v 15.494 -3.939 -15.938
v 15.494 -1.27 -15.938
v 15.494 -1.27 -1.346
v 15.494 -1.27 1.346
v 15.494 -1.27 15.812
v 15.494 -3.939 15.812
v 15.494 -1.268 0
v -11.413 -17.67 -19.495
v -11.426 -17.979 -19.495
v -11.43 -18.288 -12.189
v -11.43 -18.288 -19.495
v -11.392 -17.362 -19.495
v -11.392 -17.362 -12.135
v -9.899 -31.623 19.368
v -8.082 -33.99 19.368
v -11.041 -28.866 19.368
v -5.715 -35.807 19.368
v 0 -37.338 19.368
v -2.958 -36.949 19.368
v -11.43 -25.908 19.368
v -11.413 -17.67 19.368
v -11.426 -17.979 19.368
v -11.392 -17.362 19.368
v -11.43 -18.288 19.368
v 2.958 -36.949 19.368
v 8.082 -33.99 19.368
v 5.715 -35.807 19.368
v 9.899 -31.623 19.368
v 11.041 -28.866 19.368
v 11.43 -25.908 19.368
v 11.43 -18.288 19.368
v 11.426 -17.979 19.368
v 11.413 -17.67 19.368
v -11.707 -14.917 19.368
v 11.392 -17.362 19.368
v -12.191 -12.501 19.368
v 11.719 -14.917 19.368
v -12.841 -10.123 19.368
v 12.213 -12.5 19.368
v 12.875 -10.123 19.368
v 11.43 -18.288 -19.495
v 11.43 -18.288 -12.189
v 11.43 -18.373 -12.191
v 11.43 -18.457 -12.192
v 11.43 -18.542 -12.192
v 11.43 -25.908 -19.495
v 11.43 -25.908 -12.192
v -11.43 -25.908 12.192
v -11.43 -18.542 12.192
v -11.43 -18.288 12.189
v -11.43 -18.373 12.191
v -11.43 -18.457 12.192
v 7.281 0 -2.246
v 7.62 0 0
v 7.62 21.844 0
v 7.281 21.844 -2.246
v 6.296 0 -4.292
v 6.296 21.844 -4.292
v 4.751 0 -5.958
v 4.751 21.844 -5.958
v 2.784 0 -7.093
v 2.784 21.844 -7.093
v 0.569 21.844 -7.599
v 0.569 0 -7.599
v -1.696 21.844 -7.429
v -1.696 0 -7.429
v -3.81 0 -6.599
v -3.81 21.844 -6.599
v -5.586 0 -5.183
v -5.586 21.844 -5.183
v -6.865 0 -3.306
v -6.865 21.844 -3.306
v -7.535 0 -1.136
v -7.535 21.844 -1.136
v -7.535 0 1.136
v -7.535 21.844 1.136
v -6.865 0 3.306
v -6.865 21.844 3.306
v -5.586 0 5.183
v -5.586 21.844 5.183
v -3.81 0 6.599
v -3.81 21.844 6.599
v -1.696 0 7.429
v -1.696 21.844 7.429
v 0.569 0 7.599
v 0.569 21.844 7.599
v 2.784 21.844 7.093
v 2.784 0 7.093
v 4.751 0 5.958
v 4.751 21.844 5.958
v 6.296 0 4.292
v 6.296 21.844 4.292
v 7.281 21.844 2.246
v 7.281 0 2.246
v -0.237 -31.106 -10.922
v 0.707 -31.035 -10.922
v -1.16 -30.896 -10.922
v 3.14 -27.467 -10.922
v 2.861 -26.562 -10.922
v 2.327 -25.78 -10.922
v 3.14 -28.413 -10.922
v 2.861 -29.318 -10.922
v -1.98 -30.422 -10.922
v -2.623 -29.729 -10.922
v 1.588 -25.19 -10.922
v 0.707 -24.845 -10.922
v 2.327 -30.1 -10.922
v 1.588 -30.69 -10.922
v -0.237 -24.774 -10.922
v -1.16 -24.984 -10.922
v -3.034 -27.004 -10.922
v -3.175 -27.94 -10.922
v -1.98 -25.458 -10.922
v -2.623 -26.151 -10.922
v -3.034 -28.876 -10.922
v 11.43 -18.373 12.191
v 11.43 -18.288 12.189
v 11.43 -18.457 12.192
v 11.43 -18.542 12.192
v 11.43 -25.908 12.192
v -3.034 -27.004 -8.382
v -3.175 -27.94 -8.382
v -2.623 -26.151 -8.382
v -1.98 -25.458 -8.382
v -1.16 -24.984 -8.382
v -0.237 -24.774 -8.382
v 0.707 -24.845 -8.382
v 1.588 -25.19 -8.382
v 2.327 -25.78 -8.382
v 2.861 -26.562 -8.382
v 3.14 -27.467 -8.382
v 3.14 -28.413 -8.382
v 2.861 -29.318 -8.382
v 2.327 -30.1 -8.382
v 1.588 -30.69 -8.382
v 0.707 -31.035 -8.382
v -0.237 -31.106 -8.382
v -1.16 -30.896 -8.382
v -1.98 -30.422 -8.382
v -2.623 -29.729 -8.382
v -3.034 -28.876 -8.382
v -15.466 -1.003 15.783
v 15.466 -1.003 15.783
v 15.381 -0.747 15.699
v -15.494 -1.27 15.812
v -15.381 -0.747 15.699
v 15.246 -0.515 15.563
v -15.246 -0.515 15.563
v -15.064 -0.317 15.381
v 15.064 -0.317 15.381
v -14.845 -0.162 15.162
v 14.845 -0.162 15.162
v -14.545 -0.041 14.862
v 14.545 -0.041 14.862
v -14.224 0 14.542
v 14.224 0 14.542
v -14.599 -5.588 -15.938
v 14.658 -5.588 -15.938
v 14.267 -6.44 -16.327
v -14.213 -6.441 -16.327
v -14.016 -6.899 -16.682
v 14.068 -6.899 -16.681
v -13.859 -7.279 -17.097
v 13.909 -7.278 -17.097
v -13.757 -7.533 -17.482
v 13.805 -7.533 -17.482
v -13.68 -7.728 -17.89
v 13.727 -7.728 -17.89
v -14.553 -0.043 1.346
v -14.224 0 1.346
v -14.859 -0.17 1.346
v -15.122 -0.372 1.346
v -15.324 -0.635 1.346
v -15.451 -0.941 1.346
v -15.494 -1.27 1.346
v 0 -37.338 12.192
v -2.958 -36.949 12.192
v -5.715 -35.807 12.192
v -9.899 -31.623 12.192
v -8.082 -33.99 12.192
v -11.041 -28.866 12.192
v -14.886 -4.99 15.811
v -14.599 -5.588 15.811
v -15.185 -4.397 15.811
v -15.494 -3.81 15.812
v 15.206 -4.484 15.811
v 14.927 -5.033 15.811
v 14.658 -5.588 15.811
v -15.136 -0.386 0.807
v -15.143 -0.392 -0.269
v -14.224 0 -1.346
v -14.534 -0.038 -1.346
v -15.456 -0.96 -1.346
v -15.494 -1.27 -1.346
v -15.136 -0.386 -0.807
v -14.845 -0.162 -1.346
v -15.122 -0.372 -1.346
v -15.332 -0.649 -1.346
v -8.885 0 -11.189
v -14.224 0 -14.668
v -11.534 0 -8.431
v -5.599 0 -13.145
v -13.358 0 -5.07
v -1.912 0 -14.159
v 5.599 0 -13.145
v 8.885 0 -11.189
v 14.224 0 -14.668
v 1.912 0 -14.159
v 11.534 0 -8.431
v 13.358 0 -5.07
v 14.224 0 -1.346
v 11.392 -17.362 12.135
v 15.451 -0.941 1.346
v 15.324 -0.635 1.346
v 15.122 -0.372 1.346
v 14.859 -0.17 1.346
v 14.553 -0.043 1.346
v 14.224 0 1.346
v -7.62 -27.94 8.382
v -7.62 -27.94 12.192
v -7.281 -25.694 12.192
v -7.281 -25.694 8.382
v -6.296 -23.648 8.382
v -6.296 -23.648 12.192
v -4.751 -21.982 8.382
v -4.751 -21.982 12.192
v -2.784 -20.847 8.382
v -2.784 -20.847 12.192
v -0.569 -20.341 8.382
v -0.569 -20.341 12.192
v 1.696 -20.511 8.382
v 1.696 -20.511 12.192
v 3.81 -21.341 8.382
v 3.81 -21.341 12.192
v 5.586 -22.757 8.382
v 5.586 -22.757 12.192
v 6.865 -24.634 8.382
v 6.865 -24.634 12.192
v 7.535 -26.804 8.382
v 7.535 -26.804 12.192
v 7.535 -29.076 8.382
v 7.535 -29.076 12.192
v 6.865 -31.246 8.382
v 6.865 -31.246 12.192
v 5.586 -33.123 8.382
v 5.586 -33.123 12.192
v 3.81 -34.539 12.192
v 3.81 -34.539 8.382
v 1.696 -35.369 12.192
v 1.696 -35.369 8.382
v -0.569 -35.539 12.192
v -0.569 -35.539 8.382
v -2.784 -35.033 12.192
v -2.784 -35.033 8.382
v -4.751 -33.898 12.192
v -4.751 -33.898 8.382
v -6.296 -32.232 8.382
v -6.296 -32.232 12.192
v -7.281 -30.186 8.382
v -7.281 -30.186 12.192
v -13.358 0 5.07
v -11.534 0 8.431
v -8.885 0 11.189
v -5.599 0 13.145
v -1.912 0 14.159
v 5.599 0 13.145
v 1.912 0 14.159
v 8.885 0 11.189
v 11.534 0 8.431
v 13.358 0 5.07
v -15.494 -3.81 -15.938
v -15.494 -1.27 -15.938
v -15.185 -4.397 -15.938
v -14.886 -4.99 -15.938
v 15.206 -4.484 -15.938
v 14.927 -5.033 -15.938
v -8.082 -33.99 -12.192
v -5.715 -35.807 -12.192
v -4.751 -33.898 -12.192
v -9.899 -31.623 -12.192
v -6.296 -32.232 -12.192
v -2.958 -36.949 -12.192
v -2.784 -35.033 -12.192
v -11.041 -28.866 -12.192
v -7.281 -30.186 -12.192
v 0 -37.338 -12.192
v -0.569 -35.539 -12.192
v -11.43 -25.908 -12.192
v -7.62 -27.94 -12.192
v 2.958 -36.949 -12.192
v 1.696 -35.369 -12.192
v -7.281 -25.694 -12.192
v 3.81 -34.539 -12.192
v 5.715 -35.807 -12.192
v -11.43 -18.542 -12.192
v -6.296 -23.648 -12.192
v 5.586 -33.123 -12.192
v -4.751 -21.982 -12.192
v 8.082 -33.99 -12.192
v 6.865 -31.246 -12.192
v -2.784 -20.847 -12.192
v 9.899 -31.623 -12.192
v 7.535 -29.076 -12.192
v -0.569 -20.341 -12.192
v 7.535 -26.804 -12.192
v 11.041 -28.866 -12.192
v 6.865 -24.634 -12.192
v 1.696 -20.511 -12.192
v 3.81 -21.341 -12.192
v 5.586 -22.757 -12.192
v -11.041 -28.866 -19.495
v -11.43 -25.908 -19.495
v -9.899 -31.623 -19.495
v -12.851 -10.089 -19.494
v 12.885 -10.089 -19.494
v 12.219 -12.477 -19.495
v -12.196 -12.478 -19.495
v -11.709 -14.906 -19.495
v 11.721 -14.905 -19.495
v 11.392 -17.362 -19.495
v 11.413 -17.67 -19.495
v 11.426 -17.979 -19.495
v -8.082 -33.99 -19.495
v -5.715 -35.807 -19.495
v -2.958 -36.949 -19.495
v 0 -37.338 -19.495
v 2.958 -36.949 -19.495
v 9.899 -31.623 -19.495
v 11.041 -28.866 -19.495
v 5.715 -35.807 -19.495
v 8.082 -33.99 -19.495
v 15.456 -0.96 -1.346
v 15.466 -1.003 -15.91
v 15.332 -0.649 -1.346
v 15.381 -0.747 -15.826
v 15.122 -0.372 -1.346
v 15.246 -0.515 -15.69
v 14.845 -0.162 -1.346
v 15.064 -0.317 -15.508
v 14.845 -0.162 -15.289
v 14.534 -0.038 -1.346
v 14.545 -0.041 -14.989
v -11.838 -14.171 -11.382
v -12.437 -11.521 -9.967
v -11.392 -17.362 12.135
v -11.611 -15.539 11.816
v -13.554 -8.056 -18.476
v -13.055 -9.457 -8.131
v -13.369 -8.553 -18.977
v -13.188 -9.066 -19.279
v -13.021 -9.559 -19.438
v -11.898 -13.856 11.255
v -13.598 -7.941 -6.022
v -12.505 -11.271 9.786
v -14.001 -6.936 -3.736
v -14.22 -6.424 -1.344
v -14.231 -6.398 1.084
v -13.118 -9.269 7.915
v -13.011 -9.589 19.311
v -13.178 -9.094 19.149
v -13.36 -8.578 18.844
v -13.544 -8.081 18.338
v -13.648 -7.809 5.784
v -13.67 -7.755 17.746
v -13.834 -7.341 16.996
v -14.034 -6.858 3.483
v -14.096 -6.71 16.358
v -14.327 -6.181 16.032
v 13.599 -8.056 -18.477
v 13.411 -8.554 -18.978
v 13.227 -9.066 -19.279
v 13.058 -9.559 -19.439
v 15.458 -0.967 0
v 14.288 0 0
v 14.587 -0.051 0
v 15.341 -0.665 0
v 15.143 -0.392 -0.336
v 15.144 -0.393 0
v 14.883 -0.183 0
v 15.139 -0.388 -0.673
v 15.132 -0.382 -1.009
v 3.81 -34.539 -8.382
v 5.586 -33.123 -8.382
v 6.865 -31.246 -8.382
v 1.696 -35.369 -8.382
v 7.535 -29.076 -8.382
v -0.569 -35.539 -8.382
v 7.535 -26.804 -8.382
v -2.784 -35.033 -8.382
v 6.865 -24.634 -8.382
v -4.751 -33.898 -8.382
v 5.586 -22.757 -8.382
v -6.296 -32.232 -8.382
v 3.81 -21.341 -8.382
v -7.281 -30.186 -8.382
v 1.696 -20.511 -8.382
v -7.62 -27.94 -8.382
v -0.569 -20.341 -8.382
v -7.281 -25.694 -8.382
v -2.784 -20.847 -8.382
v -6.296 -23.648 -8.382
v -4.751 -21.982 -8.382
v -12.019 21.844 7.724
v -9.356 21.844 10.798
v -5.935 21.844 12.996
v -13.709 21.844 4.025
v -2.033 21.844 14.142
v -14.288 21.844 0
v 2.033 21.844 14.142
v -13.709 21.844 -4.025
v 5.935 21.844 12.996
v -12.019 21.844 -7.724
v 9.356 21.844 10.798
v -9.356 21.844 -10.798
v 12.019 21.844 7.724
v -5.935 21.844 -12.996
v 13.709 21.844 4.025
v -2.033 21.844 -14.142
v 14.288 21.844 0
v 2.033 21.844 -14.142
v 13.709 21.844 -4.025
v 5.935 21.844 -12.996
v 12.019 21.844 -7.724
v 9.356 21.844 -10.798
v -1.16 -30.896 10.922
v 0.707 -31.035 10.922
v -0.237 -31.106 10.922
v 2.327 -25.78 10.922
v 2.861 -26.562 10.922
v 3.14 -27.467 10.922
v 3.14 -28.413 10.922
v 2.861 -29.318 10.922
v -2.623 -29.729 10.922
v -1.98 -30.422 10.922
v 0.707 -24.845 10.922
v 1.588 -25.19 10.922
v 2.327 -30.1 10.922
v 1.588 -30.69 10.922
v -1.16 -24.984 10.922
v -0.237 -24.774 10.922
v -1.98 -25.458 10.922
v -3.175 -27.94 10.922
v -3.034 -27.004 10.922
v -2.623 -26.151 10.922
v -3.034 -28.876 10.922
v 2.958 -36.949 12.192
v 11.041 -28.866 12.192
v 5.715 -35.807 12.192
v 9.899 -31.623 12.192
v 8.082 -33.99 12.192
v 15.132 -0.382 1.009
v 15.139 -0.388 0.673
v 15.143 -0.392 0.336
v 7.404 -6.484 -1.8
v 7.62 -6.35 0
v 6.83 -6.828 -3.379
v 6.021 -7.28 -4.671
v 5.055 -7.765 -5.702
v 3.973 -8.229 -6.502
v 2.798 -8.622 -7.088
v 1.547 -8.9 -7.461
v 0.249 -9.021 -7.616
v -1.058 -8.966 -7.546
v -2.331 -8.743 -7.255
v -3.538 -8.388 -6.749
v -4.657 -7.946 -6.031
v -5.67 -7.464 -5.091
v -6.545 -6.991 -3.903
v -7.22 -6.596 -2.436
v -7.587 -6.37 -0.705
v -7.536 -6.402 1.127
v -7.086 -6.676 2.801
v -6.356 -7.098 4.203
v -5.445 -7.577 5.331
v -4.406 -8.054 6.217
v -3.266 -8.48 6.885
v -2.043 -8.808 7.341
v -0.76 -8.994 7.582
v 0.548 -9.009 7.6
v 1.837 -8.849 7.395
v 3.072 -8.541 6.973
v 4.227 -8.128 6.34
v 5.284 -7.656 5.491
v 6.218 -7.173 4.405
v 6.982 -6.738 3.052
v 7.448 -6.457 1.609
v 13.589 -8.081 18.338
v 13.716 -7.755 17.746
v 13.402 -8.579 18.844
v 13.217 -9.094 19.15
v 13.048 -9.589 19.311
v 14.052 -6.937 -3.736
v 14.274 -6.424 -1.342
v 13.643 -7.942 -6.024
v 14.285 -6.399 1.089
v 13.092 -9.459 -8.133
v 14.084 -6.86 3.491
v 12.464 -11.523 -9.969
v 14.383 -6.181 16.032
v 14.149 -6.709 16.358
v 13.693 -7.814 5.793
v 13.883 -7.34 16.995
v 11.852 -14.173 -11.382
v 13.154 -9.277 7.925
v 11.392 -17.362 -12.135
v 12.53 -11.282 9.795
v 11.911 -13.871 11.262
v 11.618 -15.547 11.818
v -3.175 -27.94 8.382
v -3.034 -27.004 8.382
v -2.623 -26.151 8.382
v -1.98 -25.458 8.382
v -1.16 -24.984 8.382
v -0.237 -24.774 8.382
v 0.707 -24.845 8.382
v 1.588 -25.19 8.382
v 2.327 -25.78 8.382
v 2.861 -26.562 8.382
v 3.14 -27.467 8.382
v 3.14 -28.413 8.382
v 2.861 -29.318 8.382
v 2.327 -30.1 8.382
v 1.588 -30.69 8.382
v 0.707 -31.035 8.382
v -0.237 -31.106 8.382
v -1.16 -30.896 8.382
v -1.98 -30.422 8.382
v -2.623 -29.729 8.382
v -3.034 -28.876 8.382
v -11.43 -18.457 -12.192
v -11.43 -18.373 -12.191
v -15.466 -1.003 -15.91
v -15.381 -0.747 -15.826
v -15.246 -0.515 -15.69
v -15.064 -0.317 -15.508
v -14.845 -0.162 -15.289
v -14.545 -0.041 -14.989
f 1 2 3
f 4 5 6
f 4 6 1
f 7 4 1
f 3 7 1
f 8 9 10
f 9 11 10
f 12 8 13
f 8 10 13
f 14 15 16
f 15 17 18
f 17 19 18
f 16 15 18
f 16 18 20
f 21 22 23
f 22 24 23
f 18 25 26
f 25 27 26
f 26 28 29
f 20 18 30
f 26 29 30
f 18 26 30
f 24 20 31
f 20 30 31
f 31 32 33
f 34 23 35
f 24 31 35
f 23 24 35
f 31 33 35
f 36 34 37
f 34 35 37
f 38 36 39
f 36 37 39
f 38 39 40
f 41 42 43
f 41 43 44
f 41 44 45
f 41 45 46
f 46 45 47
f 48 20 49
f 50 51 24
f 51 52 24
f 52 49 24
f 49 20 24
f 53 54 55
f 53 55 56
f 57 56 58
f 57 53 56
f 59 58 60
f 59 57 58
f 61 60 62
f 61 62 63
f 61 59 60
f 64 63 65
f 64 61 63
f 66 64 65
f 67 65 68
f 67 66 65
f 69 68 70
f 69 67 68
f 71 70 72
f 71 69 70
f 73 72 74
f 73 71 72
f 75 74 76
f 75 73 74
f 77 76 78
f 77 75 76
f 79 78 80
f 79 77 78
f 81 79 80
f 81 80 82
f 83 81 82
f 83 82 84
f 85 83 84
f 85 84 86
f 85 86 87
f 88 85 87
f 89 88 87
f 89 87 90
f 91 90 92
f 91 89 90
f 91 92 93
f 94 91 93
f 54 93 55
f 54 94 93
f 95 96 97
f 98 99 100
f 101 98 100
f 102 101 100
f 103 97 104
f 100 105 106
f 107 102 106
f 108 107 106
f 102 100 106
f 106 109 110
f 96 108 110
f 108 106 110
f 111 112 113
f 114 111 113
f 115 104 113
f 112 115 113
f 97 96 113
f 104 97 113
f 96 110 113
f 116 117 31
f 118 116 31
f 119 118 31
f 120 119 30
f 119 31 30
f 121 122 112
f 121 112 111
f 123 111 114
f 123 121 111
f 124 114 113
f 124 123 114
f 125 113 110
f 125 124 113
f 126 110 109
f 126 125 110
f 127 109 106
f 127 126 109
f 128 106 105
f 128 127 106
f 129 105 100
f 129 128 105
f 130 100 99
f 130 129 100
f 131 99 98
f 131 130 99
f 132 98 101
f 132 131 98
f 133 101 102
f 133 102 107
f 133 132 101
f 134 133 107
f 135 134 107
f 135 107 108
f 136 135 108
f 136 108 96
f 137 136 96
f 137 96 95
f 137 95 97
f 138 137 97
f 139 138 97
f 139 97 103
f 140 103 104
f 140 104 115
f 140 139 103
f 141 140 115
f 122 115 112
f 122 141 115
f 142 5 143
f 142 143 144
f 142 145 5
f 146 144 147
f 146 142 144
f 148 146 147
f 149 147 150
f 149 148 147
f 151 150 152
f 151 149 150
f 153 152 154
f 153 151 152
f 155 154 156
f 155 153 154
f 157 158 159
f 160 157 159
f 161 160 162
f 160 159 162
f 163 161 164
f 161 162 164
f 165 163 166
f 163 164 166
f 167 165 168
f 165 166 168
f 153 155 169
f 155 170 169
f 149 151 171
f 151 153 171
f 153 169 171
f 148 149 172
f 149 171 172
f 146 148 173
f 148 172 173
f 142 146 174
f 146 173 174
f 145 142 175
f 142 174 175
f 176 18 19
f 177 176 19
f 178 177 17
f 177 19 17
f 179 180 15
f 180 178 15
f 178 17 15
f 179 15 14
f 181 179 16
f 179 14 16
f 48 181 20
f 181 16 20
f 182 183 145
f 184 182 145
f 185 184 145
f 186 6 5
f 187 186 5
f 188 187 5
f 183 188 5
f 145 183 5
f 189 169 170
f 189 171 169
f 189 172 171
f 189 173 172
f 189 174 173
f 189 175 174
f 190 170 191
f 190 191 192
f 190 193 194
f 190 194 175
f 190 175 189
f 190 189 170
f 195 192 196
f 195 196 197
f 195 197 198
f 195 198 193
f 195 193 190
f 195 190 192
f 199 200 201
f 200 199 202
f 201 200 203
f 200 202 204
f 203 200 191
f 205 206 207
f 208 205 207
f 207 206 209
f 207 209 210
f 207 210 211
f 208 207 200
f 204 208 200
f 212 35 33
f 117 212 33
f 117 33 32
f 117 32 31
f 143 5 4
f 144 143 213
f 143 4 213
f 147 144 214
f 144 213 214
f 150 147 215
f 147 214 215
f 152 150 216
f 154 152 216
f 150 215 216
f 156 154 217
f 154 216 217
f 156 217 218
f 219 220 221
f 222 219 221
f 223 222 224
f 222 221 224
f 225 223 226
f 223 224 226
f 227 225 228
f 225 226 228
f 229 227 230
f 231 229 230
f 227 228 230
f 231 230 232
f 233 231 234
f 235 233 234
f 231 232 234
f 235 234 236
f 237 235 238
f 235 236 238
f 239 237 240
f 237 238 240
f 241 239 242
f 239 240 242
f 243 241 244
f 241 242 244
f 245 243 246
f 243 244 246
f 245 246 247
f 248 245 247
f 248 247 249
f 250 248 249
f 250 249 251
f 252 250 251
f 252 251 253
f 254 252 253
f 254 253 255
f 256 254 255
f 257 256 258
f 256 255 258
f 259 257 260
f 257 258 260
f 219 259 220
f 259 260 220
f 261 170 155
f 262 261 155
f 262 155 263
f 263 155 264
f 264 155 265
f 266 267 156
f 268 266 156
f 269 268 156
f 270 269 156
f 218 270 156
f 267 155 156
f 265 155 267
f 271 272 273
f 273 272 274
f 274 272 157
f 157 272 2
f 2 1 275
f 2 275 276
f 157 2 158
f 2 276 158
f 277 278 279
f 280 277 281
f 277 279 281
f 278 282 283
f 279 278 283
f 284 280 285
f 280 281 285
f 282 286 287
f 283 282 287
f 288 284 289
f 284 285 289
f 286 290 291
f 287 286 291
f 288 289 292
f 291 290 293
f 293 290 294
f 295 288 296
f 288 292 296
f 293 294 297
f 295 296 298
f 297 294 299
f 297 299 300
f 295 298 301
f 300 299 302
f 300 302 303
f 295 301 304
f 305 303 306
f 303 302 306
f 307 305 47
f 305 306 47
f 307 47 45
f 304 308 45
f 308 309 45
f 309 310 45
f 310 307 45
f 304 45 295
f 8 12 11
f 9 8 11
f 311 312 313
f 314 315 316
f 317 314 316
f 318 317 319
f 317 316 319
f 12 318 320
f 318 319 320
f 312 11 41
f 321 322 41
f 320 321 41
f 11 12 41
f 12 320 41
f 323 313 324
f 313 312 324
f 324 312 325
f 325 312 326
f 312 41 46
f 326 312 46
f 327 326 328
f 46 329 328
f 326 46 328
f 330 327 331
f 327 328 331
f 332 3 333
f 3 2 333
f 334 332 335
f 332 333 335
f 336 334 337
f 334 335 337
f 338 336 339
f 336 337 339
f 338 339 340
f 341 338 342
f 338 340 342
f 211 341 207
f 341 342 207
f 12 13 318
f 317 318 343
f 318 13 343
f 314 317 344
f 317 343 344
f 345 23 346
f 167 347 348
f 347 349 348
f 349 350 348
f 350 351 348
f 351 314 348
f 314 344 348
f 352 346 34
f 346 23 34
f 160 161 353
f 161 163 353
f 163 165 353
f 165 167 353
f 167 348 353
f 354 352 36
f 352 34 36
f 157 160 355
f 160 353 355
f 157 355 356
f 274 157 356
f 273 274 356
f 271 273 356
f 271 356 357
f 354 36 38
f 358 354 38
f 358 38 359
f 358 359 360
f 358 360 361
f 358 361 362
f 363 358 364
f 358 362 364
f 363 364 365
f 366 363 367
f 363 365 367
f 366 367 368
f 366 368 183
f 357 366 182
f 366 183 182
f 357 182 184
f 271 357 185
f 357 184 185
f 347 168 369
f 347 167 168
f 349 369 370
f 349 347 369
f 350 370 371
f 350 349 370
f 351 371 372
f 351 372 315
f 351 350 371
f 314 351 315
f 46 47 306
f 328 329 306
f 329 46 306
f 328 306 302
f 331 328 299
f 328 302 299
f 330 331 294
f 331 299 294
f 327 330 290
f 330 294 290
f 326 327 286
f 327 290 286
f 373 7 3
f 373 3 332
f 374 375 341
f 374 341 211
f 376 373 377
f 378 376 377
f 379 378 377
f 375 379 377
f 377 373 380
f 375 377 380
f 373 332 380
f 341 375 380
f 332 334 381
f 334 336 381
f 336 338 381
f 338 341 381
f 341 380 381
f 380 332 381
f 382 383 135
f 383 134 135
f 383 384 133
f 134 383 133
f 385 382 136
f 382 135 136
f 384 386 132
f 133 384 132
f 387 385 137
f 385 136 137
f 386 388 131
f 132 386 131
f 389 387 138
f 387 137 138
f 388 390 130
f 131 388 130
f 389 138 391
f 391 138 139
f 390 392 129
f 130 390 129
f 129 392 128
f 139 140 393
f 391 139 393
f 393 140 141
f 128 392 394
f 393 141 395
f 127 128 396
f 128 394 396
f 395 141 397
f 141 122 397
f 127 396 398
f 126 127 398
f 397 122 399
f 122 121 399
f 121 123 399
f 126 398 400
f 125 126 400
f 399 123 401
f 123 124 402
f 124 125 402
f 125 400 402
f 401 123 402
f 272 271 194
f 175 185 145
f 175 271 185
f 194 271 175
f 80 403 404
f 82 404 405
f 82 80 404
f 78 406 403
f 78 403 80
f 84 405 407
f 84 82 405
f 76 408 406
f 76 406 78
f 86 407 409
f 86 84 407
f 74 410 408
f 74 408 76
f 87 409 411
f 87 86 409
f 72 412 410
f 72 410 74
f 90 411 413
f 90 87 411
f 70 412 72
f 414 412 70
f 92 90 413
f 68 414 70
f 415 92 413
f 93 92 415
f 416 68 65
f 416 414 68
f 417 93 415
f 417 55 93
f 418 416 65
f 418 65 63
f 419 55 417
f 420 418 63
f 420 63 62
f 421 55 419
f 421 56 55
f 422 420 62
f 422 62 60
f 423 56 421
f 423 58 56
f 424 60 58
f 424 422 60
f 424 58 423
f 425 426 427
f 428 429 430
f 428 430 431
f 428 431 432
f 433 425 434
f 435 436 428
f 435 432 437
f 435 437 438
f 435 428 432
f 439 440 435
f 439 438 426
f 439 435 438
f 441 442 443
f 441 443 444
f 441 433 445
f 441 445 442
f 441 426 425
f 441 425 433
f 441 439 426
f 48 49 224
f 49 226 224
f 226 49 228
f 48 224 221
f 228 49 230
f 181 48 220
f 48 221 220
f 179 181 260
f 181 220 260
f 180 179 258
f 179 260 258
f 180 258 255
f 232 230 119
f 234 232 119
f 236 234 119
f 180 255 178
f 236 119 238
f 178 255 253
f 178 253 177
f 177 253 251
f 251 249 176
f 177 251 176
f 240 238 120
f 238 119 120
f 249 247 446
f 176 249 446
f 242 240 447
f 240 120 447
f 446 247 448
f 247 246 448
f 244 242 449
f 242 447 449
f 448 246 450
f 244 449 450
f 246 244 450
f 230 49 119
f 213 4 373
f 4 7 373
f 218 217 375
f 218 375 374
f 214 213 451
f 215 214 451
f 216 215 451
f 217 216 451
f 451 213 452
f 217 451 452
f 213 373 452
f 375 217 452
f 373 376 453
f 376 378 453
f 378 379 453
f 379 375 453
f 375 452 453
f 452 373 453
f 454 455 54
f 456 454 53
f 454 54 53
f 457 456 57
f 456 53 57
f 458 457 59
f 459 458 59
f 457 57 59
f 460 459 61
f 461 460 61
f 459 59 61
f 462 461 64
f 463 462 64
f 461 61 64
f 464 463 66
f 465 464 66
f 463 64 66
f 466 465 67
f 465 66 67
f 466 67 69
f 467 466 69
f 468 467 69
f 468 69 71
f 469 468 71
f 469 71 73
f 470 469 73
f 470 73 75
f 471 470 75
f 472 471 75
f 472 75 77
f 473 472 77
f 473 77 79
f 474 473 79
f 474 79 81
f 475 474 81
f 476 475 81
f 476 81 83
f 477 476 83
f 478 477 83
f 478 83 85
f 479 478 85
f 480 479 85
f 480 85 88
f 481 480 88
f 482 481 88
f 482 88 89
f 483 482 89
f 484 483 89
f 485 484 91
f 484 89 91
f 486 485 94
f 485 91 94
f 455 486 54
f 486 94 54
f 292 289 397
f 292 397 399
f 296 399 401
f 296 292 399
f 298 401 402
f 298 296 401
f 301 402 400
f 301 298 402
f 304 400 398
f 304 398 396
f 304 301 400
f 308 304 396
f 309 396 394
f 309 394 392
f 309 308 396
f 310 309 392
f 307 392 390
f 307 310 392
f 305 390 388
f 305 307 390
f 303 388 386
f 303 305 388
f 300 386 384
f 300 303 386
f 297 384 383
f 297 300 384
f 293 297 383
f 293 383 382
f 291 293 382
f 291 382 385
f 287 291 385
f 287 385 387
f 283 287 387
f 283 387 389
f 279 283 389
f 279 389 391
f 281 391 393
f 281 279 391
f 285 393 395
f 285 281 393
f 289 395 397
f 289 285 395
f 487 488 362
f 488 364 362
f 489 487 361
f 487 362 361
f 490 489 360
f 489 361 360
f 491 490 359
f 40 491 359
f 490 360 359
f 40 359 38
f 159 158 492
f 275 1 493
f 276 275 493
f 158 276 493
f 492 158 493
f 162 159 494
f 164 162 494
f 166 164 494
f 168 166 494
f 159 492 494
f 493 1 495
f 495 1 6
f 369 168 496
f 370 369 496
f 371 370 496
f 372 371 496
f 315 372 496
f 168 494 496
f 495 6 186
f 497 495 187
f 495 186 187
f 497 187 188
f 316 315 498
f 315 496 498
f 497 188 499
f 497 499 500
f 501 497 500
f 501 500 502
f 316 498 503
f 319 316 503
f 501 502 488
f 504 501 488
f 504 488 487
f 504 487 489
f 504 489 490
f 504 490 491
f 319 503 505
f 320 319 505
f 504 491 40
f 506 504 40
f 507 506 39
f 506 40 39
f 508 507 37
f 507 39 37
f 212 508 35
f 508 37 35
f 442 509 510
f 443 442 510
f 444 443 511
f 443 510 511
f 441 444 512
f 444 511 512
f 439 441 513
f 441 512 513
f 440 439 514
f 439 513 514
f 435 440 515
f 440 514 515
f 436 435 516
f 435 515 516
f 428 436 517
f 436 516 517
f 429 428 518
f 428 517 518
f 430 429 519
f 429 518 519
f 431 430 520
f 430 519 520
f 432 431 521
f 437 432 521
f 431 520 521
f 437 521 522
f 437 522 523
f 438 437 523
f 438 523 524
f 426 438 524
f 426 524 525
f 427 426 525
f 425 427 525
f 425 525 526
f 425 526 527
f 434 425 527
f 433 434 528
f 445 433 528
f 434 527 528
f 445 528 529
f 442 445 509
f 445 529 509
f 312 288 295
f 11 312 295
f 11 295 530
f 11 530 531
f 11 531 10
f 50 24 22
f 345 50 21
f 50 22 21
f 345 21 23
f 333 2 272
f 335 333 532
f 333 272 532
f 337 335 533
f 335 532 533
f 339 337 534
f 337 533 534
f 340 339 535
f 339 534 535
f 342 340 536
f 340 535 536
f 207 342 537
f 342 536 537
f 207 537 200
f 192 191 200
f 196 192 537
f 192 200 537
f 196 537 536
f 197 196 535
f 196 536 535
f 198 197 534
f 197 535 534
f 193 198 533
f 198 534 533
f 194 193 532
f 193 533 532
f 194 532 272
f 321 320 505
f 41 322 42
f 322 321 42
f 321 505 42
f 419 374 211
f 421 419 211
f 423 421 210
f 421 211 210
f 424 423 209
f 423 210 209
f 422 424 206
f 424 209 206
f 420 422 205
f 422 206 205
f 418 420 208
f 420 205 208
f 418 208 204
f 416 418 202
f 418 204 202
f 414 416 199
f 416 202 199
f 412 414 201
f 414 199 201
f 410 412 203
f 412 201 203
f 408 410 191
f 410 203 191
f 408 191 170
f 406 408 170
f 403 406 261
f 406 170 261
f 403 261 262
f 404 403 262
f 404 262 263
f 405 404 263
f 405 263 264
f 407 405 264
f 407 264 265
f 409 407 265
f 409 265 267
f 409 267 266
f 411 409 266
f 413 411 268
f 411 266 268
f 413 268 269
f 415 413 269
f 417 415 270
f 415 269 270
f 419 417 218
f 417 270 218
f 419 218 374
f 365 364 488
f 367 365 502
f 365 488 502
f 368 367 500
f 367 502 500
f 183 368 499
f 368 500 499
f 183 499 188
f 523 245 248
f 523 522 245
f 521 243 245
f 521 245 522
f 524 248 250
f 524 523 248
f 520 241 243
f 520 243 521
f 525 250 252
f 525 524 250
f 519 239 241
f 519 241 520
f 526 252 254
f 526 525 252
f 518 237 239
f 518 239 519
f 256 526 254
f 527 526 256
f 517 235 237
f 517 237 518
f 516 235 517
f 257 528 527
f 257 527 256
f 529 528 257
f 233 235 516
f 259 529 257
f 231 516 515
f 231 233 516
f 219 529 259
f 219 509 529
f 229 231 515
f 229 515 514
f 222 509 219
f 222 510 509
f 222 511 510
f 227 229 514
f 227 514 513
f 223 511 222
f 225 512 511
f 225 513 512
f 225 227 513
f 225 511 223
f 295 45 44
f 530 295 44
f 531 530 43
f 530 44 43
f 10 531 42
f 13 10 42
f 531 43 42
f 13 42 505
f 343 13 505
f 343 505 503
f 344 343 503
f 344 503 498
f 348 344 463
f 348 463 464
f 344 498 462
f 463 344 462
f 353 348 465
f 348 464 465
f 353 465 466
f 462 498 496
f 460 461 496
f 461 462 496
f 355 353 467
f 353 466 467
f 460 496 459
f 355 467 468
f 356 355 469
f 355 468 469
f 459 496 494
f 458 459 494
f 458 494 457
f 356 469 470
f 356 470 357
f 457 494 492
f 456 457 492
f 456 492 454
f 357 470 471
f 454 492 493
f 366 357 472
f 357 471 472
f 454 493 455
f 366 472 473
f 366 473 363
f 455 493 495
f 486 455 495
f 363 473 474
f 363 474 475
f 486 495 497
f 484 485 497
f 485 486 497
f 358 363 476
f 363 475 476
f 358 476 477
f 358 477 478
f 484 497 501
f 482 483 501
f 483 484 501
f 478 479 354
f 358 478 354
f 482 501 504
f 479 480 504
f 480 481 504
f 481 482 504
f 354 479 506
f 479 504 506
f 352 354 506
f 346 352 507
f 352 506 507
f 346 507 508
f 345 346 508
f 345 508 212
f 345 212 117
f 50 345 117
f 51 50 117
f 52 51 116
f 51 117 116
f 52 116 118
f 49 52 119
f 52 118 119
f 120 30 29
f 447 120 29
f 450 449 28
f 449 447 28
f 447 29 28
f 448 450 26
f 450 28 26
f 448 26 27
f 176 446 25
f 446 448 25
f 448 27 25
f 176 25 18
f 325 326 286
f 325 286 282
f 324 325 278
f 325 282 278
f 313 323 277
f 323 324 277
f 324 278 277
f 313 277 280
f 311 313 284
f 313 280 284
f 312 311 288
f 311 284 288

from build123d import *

# Parameters (mm, degrees)
SKETCH1_R           = 14.2875
SKETCH1_R_2         = 7.62
BOSS_EXTRUDE1_DEPTH = 21.844
SKETCH2_W           = 57.929815832
SKETCH2_H           = 52.792019068
BOSS_EXTRUDE2_DEPTH = 37.338
CUT_EXTRUDE2_DEPTH  = 53.792019068
SKETCH5_W           = 10.584509534
SKETCH5_H           = 3.93875565
SKETCH5_W_2         = 10.457509534
CUT_EXTRUDE3_DEPTH  = 37.338
FILLET2_R           = 2.54
SKETCH6_R           = 7.62
CUT_EXTRUDE4_DEPTH  = 37.338
SKETCH7_R           = 7.62
BOSS_EXTRUDE3_DEPTH = 3.81
SKETCH8_R           = 3.175
CUT_EXTRUDE5_DEPTH  = 2.54
FILLET8_R           = 1.27


with BuildPart() as part:
    # Sketch1 → Boss-Extrude1 (new body)
    with BuildSketch(Plane(origin=(0, 0, 0), x_dir=(1, 0, 0), z_dir=(0, 1, 0))):
        Circle(SKETCH1_R)
        Circle(SKETCH1_R_2, mode=Mode.SUBTRACT)
    extrude(amount=BOSS_EXTRUDE1_DEPTH)

    # Sketch2 → Boss-Extrude2 (add)
    with BuildSketch(Plane.XZ):
        Rectangle(SKETCH2_W, SKETCH2_H)
    extrude(amount=BOSS_EXTRUDE2_DEPTH)

    # Sketch4 → Cut-Extrude2 (cut, through all)
    with BuildSketch(Plane.XY.offset(26.396009534)):
        with BuildLine():
            Line((-15.494, -3.81), (-15.494, 0))
            Line((-15.494, 0), (-28.964907916, 0))
            Line((-28.964907916, 0), (-28.964907916, -37.338))
            Line((-28.964907916, -37.338), (0, -37.338))
            ThreePointArc((0, -37.338), (-8.082230509, -33.990230509), (-11.43, -25.908))
            Line((-11.43, -25.908), (-11.43, -18.288))
            ThreePointArc((-11.43, -18.288), (-11.420600472, -17.824551121), (-11.392417347, -17.361864482))
            ThreePointArc((-11.392417347, -17.361864482), (-12.761894788, -10.37972702), (-15.494, -3.81))
        make_face()
        with BuildLine():
            Line((28.964907916, 0), (15.494, 0))
            Line((15.494, 0), (15.494, -3.93875565))
            ThreePointArc((15.494, -3.93875565), (12.774357484, -10.445935023), (11.392417347, -17.361864482))
            ThreePointArc((11.392417347, -17.361864482), (11.420600472, -17.824551121), (11.43, -18.288))
            Line((11.43, -18.288), (11.43, -25.908))
            ThreePointArc((11.43, -25.908), (8.082230509, -33.990230509), (0, -37.338))
            Line((0, -37.338), (28.964907916, -37.338))
            Line((28.964907916, -37.338), (28.964907916, 0))
        make_face()
    extrude(amount=-CUT_EXTRUDE2_DEPTH, mode=Mode.SUBTRACT)

    # Sketch5 → Cut-Extrude3 (cut)
    with BuildSketch(Plane(origin=(15.494, 0, 0), x_dir=(0, 0, -1), z_dir=(1, 0, 0))):
        with BuildLine():
            Line((-15.8115, -5.588), (-15.8115, -3.93875565))
            Line((-15.8115, -3.93875565), (-26.396009534, -3.93875565))
            Line((-26.396009534, -3.93875565), (-26.396009534, -37.338))
            Line((-26.396009534, -37.338), (-19.3675, -37.338))
            Line((-19.3675, -37.338), (-19.3675, -7.9375))
            ThreePointArc((-19.3675, -7.9375), (-17.140553933, -7.44223594), (-15.8115, -5.588))
        make_face()
        with Locations((-21.103754767, -1.969377825)):
            Rectangle(SKETCH5_W, SKETCH5_H)
        with BuildLine():
            Line((-12.192, -18.542), (-12.192, -37.338))
            Line((-12.192, -37.338), (12.192, -37.338))
            Line((12.192, -37.338), (12.192, -18.542))
            ThreePointArc((12.192, -18.542), (0, -6.35), (-12.192, -18.542))
        make_face()
        with Locations((21.167254767, -1.969377825)):
            Rectangle(SKETCH5_W_2, SKETCH5_H)
        with BuildLine():
            Line((26.396009534, -3.93875565), (15.9385, -3.93875565))
            Line((15.9385, -3.93875565), (15.9385, -5.588))
            ThreePointArc((15.9385, -5.588), (17.286672159, -7.413300245), (19.4945, -7.9375))
            Line((19.4945, -7.9375), (19.4945, -37.338))
            Line((19.4945, -37.338), (26.396009534, -37.338))
            Line((26.396009534, -37.338), (26.396009534, -3.93875565))
        make_face()
    extrude(amount=-CUT_EXTRUDE3_DEPTH, mode=Mode.SUBTRACT)

    # Fillet2
    fillet2_edges = [part.edges().sort_by_distance(p)[0] for p in [
        (0.02275558, -7.9375, 19.3675),
        (0.02275558, -7.9375, -19.4945),
    ]]
    fillet(fillet2_edges, radius=FILLET2_R)

    # Sketch6 → Cut-Extrude4 (cut)
    with BuildSketch(Plane(origin=(0, 0, 0), x_dir=(1, 0, 0), z_dir=(0, 1, 0))):
        Circle(SKETCH6_R)
    extrude(amount=-CUT_EXTRUDE4_DEPTH, mode=Mode.SUBTRACT)

    # Sketch7 → Boss-Extrude3 (add)
    with BuildSketch(Plane(origin=(0, 0, 12.192), x_dir=(-1, 0, 0), z_dir=(0, 0, -1))):
        with Locations((0, -27.94)):
            Circle(SKETCH7_R)
    boss_extrude3 = extrude(amount=BOSS_EXTRUDE3_DEPTH)

    # Mirror1: Boss-Extrude3 across plane
    add(boss_extrude3.mirror(Plane.XY))

    # Sketch8 → Cut-Extrude5 (cut)
    with BuildSketch(Plane(origin=(0, 0, 8.382), x_dir=(-1, 0, 0), z_dir=(0, 0, -1))):
        with Locations((0, -27.94)):
            Circle(SKETCH8_R)
    cut_extrude5 = extrude(amount=-CUT_EXTRUDE5_DEPTH, mode=Mode.SUBTRACT)

    # Mirror2: Cut-Extrude5 across plane
    add(cut_extrude5.mirror(Plane.XY), mode=Mode.SUBTRACT)

    # Fillet8
    fillet8_edges = [part.edges().sort_by_distance(p)[0] for p in [
        (0, 0, 15.8115),
        (0, 0, -15.9385),
        (15.494, 0, -0.0635),
        (-15.494, 0, -0.0635),
    ]]
    fillet(fillet8_edges, radius=FILLET8_R)


solid = part.part
